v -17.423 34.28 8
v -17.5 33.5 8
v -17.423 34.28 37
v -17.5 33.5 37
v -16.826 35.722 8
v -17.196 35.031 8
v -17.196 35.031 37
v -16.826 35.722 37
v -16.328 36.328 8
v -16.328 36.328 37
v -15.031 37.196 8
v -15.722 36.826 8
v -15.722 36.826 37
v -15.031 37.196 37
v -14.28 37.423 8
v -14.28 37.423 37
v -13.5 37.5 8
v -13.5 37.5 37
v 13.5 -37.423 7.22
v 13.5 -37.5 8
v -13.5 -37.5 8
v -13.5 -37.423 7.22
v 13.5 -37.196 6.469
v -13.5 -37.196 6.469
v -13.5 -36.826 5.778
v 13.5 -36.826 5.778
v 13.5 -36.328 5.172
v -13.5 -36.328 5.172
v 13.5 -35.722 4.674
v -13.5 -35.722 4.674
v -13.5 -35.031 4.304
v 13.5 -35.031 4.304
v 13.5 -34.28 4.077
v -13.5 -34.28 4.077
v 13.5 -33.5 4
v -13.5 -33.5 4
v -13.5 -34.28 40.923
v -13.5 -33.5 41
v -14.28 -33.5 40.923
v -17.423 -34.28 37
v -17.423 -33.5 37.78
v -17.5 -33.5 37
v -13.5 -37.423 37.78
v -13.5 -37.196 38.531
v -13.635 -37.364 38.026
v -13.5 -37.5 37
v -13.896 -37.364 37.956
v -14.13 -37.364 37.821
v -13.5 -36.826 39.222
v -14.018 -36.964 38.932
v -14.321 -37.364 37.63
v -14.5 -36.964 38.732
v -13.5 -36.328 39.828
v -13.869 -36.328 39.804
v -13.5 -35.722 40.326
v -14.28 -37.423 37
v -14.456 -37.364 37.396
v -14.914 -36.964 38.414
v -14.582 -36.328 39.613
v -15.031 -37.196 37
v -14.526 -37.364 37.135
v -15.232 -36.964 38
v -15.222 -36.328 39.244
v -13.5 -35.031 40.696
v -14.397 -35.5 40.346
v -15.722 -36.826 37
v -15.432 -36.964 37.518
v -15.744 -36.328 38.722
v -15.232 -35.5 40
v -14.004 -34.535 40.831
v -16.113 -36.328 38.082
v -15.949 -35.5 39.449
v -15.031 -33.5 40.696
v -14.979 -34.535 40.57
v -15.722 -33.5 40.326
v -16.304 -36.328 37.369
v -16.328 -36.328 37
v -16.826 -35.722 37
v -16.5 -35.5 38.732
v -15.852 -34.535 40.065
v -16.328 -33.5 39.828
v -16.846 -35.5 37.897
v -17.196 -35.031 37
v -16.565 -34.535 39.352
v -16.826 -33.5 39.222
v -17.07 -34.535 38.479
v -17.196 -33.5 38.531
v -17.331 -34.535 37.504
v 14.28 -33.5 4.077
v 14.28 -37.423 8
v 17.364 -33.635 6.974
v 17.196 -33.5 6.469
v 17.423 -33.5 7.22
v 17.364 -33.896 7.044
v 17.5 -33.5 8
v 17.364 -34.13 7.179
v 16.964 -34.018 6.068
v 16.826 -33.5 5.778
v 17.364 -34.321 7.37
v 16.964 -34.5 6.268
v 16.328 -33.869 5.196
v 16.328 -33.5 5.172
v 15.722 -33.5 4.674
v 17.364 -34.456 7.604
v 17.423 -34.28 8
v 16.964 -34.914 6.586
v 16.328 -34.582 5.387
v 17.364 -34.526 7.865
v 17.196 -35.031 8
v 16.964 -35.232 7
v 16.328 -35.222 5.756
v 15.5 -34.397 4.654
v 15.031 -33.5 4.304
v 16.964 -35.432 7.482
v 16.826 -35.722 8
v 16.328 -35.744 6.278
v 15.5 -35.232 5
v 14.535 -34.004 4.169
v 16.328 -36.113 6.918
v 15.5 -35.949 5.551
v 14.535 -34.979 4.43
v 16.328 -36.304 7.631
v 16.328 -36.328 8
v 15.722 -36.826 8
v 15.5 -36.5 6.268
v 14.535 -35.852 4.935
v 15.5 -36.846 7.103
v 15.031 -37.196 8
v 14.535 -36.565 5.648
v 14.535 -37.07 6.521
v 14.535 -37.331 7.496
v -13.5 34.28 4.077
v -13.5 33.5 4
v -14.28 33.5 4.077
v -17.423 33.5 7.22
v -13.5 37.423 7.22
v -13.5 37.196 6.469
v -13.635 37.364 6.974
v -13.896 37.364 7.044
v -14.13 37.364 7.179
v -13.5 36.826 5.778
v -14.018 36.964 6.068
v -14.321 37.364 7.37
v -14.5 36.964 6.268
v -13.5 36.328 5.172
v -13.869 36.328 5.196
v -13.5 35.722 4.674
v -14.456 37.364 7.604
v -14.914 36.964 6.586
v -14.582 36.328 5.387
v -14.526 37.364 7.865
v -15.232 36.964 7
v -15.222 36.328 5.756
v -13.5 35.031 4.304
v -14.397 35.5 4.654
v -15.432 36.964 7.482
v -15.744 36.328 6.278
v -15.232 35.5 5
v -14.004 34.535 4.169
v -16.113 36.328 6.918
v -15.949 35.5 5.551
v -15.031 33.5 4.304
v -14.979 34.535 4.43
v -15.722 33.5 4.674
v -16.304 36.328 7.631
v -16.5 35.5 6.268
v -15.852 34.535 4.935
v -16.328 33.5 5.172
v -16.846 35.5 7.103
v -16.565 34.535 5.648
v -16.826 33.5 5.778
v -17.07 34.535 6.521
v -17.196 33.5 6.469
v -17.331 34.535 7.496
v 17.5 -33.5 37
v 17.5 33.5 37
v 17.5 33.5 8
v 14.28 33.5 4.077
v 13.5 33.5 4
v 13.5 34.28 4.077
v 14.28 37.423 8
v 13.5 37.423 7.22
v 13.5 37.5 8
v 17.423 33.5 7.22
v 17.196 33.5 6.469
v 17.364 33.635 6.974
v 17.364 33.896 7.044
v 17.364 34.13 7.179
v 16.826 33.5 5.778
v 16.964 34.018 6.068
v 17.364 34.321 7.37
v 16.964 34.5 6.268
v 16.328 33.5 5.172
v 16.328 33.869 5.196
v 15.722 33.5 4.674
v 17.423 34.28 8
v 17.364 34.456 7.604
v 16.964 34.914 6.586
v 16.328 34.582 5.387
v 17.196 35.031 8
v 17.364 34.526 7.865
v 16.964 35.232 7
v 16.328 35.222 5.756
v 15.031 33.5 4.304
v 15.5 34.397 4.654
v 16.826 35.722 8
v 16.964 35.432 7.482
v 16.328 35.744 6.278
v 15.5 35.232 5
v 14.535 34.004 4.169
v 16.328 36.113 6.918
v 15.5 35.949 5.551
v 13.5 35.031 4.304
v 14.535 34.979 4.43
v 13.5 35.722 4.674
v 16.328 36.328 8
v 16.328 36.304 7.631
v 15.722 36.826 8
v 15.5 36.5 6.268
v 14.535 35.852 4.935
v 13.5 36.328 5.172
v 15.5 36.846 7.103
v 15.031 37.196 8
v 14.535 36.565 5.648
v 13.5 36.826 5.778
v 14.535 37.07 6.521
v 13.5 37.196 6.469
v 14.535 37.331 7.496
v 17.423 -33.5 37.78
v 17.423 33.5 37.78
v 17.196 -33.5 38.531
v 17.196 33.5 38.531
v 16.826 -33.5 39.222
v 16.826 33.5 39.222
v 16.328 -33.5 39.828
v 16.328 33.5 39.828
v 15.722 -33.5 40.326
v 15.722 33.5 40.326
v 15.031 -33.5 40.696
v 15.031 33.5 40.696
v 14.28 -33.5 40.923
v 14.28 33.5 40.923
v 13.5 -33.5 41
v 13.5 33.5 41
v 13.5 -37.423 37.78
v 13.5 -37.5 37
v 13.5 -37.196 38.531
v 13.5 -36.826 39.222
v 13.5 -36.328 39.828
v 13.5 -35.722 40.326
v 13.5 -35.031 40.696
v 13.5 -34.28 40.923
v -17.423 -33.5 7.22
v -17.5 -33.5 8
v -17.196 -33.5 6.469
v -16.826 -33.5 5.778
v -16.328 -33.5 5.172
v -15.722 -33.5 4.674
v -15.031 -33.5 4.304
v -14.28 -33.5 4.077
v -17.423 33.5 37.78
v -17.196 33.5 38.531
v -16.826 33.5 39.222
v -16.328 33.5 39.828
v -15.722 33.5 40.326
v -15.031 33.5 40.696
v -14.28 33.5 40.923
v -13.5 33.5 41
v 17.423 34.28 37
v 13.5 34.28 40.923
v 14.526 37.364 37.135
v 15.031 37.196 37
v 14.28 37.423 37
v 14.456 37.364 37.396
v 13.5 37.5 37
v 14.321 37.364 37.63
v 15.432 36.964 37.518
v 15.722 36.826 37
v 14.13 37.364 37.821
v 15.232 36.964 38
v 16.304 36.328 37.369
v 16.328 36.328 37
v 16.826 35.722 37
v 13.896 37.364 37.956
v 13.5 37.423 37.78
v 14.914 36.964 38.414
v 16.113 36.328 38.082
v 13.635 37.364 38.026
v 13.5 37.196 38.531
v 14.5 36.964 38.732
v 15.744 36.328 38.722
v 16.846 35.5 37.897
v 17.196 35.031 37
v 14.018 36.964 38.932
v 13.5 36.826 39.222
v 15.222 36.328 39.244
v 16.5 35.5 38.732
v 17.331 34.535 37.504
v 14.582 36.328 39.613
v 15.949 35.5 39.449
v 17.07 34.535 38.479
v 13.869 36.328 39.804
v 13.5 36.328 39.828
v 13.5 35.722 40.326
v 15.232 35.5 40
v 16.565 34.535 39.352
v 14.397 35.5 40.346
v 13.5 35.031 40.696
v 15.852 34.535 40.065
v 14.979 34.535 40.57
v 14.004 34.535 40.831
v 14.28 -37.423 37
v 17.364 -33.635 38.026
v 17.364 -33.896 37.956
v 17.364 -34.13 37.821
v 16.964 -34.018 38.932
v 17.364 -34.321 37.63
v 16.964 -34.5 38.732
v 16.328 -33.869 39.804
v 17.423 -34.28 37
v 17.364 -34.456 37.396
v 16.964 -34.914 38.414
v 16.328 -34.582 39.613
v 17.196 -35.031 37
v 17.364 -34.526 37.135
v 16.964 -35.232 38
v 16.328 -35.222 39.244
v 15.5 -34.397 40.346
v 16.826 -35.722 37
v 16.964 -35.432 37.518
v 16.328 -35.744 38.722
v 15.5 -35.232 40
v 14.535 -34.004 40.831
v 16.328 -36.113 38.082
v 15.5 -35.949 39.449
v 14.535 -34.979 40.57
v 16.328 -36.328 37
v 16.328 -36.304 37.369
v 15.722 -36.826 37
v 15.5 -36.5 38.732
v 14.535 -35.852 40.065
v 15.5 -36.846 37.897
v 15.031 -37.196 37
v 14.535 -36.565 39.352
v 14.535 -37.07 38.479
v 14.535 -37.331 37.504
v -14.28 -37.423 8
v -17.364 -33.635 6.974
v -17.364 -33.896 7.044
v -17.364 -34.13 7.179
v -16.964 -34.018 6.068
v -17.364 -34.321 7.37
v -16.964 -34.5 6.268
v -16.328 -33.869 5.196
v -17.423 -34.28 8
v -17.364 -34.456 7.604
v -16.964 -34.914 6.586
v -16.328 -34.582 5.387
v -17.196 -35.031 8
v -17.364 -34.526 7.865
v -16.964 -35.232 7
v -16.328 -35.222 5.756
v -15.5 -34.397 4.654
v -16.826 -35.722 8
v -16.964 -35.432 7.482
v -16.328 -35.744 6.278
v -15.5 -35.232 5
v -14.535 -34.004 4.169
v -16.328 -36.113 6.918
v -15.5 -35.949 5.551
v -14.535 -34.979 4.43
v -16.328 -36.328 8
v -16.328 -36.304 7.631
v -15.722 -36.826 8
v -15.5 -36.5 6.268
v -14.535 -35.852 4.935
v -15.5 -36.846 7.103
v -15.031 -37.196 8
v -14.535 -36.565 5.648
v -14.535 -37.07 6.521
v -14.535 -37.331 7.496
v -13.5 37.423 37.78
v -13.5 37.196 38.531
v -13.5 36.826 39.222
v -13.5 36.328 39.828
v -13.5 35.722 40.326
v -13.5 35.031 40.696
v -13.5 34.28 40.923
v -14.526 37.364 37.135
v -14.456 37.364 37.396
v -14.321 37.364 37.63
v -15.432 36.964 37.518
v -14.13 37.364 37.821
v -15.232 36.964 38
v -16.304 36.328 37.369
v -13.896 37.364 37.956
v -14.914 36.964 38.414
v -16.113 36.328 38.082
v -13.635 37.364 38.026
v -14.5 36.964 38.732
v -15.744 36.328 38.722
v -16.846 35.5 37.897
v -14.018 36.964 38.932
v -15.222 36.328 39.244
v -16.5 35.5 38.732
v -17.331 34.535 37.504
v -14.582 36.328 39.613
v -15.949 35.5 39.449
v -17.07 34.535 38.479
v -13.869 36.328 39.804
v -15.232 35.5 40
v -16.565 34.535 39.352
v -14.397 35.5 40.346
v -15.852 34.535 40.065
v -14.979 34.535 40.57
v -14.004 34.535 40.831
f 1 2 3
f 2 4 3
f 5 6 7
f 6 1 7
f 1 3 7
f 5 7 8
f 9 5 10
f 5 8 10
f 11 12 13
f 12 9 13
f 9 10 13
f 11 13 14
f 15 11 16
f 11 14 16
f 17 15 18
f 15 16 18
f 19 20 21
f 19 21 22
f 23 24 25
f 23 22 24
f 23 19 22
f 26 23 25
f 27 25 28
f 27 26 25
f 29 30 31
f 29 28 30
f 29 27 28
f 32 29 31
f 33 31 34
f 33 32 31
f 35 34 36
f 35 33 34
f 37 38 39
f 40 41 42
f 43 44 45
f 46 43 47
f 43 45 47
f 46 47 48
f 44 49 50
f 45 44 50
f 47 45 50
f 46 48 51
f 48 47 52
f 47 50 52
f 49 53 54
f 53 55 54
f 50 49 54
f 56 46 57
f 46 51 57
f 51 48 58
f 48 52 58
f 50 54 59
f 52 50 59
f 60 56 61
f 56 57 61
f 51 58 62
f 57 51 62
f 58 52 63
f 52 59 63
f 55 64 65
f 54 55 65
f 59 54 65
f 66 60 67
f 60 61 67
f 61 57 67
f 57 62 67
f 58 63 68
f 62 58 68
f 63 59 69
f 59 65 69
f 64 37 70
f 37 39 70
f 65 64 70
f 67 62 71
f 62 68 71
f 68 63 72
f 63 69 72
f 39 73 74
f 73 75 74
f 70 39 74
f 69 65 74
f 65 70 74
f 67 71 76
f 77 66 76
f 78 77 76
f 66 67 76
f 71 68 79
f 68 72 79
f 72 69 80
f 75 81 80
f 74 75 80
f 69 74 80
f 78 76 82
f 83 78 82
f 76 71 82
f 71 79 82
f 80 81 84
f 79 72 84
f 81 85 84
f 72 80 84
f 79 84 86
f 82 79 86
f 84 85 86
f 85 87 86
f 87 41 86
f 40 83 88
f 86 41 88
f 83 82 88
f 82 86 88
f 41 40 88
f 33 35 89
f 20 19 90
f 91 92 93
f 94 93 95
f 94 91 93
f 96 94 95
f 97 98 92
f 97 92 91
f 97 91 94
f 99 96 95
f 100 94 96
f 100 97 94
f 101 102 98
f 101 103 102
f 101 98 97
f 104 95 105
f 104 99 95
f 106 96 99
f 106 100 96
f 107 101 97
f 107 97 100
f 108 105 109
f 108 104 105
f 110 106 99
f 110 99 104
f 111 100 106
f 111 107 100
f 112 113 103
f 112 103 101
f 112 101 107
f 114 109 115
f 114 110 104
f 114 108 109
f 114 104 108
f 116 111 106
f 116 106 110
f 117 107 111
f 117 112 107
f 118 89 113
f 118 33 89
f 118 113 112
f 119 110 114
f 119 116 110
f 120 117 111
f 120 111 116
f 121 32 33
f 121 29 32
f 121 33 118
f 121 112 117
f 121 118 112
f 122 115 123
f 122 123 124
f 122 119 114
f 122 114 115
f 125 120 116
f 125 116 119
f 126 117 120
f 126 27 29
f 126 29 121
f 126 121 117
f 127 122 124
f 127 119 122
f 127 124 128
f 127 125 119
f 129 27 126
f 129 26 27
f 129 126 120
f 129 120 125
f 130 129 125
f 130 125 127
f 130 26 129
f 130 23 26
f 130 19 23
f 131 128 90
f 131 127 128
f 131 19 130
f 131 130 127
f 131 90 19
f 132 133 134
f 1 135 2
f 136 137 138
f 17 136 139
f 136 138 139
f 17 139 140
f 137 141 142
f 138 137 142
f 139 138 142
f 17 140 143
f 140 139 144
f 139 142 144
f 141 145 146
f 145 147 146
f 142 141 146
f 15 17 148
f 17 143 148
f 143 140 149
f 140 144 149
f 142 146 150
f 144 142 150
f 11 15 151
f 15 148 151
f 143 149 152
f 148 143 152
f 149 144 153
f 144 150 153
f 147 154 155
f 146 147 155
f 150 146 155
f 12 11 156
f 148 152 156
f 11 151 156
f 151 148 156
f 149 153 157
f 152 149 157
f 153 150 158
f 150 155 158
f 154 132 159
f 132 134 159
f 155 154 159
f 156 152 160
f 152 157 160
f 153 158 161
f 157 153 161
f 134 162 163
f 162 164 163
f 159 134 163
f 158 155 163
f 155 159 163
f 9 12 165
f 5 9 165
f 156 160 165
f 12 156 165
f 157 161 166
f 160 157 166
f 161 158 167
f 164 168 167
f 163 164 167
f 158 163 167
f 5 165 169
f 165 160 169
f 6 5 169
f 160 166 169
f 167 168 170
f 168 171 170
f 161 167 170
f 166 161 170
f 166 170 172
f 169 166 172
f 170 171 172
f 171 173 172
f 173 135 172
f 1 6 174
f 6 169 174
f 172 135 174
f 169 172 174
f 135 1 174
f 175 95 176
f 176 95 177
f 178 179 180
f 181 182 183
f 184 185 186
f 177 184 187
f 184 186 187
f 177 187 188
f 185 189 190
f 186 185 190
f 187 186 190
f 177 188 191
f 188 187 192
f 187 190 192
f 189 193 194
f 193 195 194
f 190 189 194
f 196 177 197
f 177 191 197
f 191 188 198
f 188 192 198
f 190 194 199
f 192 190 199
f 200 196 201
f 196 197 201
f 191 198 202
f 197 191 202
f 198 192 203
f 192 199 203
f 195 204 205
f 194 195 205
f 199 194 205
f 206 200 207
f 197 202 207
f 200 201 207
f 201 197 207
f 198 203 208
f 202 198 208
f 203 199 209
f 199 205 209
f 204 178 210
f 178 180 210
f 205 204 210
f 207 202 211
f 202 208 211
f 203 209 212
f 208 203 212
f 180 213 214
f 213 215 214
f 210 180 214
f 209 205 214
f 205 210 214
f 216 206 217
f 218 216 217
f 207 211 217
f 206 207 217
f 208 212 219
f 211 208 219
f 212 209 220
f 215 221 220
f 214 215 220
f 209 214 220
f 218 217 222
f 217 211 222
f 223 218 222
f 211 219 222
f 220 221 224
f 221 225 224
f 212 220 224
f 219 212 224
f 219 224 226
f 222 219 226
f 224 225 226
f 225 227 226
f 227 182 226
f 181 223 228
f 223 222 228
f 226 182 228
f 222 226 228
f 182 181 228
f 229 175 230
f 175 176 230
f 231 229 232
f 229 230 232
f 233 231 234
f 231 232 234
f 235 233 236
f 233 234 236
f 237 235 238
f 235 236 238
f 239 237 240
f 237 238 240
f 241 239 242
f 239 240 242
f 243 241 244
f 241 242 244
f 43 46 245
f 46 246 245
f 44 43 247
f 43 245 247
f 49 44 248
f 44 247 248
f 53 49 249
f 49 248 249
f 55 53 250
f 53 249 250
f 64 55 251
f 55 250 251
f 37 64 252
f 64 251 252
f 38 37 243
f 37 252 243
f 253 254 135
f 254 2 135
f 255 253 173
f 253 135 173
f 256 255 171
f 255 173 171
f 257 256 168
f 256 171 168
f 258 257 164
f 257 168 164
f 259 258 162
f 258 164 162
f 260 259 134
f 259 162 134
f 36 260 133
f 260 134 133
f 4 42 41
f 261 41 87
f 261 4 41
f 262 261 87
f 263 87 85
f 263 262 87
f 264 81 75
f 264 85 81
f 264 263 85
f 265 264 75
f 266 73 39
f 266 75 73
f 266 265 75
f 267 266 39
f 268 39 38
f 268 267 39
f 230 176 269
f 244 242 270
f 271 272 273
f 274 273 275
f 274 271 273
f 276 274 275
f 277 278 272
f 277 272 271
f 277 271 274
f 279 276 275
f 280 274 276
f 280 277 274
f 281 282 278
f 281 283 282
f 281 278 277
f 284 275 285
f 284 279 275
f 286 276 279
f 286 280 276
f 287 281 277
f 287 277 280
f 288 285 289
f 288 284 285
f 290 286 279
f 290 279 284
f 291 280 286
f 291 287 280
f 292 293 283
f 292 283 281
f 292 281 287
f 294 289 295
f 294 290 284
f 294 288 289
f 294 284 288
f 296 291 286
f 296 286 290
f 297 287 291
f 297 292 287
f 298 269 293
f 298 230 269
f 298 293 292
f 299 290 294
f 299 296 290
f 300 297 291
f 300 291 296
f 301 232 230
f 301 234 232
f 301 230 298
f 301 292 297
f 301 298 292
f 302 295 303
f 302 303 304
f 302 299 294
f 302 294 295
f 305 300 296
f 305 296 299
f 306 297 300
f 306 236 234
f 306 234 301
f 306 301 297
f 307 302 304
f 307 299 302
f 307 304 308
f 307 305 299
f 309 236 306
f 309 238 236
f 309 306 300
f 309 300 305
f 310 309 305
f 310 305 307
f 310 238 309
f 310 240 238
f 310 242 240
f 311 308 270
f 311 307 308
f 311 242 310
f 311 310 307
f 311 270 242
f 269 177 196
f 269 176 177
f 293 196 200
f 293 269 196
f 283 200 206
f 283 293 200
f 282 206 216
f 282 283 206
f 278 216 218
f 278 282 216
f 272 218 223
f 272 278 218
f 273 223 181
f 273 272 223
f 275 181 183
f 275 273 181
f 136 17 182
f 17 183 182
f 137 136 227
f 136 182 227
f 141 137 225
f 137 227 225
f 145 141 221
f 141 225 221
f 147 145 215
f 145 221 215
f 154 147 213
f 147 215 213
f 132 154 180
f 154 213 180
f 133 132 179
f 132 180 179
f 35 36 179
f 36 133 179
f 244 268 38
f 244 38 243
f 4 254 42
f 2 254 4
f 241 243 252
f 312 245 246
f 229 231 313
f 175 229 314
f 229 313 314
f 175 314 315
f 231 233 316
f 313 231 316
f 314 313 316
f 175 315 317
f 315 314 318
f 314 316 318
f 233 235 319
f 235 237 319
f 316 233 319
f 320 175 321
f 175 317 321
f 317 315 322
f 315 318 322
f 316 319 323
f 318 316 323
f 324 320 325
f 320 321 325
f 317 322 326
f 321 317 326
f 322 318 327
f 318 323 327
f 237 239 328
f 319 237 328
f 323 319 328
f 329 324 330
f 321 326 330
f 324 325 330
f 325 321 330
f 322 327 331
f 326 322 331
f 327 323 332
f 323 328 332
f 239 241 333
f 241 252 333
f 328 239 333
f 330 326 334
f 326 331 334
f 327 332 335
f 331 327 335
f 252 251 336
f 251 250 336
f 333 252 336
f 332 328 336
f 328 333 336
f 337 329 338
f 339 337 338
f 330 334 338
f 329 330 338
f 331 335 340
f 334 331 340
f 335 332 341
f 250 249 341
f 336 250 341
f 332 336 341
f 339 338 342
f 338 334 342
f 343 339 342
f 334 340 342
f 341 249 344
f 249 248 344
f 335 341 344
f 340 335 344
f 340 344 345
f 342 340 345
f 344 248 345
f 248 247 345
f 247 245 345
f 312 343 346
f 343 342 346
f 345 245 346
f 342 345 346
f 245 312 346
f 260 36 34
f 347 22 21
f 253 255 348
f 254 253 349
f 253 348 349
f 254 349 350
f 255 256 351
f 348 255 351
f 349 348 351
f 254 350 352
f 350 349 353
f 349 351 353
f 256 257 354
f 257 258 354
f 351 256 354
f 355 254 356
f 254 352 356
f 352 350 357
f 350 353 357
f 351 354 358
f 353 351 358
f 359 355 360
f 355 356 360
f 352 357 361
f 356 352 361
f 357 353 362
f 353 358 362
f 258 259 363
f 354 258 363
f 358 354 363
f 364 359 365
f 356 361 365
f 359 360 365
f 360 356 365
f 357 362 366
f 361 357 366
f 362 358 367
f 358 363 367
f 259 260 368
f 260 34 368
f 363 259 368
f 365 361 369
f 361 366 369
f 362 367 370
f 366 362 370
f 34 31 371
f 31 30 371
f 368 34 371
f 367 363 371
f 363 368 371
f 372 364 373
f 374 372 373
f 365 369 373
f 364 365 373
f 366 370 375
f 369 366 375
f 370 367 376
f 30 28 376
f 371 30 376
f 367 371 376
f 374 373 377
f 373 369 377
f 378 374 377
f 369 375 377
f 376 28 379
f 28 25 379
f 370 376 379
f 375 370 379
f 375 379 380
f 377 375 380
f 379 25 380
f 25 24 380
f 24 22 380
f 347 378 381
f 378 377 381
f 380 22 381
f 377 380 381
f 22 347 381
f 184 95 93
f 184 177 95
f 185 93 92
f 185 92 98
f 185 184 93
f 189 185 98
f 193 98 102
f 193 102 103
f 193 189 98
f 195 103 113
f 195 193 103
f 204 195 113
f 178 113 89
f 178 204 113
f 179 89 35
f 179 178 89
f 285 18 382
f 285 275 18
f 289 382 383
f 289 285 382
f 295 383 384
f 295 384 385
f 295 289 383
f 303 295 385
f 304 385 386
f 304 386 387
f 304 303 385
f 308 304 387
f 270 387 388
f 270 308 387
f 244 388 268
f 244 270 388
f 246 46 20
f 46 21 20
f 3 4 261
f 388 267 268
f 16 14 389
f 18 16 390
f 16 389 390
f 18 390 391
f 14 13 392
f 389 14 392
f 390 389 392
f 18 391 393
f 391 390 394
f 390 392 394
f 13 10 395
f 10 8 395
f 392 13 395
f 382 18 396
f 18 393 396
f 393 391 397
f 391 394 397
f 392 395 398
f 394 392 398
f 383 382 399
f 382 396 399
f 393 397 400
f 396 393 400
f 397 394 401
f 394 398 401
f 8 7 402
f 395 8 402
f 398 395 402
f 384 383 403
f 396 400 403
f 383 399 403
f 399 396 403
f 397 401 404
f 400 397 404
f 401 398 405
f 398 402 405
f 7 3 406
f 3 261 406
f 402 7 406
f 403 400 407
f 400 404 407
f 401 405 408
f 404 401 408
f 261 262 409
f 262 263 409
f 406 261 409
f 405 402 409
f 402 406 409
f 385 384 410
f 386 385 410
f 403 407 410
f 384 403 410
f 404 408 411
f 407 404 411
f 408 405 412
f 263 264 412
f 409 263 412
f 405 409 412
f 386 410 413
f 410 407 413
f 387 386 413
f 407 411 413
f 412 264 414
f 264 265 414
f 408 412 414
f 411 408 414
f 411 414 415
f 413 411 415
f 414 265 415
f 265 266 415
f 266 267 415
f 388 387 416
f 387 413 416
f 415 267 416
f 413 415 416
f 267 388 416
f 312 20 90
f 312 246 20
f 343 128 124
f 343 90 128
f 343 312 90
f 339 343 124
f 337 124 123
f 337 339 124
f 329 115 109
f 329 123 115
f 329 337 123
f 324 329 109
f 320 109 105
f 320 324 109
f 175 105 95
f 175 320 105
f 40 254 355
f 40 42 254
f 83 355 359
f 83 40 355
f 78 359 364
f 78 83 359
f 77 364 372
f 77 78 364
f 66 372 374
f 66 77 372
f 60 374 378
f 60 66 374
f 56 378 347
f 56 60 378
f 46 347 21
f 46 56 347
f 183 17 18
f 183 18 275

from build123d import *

# Parameters (mm, degrees)
SKETCH2_W           = 35
SKETCH2_H           = 75
BOSS_EXTRUDE1_DEPTH = 37
FILLET1_R           = 4


with BuildPart() as part:
    # Sketch2 → Boss-Extrude1 (new body)
    with BuildSketch(Plane.XY.offset(4)):
        Rectangle(SKETCH2_W, SKETCH2_H)
    extrude(amount=BOSS_EXTRUDE1_DEPTH)

    # Fillet1
    fillet1_edges = [part.edges().sort_by_distance(p)[0] for p in [
        (-17.5, 0, 41),
        (0, -37.5, 41),
        (17.5, 0, 41),
        (0, -37.5, 4),
        (-17.5, 0, 4),
        (0, 37.5, 4),
        (17.5, 0, 4),
        (17.5, -37.5, 22.5),
        (-17.5, -37.5, 22.5),
        (-17.5, 37.5, 22.5),
        (17.5, 37.5, 22.5),
        (0, 37.5, 41),
    ]]
    fillet(fillet1_edges, radius=FILLET1_R)


solid = part.part
